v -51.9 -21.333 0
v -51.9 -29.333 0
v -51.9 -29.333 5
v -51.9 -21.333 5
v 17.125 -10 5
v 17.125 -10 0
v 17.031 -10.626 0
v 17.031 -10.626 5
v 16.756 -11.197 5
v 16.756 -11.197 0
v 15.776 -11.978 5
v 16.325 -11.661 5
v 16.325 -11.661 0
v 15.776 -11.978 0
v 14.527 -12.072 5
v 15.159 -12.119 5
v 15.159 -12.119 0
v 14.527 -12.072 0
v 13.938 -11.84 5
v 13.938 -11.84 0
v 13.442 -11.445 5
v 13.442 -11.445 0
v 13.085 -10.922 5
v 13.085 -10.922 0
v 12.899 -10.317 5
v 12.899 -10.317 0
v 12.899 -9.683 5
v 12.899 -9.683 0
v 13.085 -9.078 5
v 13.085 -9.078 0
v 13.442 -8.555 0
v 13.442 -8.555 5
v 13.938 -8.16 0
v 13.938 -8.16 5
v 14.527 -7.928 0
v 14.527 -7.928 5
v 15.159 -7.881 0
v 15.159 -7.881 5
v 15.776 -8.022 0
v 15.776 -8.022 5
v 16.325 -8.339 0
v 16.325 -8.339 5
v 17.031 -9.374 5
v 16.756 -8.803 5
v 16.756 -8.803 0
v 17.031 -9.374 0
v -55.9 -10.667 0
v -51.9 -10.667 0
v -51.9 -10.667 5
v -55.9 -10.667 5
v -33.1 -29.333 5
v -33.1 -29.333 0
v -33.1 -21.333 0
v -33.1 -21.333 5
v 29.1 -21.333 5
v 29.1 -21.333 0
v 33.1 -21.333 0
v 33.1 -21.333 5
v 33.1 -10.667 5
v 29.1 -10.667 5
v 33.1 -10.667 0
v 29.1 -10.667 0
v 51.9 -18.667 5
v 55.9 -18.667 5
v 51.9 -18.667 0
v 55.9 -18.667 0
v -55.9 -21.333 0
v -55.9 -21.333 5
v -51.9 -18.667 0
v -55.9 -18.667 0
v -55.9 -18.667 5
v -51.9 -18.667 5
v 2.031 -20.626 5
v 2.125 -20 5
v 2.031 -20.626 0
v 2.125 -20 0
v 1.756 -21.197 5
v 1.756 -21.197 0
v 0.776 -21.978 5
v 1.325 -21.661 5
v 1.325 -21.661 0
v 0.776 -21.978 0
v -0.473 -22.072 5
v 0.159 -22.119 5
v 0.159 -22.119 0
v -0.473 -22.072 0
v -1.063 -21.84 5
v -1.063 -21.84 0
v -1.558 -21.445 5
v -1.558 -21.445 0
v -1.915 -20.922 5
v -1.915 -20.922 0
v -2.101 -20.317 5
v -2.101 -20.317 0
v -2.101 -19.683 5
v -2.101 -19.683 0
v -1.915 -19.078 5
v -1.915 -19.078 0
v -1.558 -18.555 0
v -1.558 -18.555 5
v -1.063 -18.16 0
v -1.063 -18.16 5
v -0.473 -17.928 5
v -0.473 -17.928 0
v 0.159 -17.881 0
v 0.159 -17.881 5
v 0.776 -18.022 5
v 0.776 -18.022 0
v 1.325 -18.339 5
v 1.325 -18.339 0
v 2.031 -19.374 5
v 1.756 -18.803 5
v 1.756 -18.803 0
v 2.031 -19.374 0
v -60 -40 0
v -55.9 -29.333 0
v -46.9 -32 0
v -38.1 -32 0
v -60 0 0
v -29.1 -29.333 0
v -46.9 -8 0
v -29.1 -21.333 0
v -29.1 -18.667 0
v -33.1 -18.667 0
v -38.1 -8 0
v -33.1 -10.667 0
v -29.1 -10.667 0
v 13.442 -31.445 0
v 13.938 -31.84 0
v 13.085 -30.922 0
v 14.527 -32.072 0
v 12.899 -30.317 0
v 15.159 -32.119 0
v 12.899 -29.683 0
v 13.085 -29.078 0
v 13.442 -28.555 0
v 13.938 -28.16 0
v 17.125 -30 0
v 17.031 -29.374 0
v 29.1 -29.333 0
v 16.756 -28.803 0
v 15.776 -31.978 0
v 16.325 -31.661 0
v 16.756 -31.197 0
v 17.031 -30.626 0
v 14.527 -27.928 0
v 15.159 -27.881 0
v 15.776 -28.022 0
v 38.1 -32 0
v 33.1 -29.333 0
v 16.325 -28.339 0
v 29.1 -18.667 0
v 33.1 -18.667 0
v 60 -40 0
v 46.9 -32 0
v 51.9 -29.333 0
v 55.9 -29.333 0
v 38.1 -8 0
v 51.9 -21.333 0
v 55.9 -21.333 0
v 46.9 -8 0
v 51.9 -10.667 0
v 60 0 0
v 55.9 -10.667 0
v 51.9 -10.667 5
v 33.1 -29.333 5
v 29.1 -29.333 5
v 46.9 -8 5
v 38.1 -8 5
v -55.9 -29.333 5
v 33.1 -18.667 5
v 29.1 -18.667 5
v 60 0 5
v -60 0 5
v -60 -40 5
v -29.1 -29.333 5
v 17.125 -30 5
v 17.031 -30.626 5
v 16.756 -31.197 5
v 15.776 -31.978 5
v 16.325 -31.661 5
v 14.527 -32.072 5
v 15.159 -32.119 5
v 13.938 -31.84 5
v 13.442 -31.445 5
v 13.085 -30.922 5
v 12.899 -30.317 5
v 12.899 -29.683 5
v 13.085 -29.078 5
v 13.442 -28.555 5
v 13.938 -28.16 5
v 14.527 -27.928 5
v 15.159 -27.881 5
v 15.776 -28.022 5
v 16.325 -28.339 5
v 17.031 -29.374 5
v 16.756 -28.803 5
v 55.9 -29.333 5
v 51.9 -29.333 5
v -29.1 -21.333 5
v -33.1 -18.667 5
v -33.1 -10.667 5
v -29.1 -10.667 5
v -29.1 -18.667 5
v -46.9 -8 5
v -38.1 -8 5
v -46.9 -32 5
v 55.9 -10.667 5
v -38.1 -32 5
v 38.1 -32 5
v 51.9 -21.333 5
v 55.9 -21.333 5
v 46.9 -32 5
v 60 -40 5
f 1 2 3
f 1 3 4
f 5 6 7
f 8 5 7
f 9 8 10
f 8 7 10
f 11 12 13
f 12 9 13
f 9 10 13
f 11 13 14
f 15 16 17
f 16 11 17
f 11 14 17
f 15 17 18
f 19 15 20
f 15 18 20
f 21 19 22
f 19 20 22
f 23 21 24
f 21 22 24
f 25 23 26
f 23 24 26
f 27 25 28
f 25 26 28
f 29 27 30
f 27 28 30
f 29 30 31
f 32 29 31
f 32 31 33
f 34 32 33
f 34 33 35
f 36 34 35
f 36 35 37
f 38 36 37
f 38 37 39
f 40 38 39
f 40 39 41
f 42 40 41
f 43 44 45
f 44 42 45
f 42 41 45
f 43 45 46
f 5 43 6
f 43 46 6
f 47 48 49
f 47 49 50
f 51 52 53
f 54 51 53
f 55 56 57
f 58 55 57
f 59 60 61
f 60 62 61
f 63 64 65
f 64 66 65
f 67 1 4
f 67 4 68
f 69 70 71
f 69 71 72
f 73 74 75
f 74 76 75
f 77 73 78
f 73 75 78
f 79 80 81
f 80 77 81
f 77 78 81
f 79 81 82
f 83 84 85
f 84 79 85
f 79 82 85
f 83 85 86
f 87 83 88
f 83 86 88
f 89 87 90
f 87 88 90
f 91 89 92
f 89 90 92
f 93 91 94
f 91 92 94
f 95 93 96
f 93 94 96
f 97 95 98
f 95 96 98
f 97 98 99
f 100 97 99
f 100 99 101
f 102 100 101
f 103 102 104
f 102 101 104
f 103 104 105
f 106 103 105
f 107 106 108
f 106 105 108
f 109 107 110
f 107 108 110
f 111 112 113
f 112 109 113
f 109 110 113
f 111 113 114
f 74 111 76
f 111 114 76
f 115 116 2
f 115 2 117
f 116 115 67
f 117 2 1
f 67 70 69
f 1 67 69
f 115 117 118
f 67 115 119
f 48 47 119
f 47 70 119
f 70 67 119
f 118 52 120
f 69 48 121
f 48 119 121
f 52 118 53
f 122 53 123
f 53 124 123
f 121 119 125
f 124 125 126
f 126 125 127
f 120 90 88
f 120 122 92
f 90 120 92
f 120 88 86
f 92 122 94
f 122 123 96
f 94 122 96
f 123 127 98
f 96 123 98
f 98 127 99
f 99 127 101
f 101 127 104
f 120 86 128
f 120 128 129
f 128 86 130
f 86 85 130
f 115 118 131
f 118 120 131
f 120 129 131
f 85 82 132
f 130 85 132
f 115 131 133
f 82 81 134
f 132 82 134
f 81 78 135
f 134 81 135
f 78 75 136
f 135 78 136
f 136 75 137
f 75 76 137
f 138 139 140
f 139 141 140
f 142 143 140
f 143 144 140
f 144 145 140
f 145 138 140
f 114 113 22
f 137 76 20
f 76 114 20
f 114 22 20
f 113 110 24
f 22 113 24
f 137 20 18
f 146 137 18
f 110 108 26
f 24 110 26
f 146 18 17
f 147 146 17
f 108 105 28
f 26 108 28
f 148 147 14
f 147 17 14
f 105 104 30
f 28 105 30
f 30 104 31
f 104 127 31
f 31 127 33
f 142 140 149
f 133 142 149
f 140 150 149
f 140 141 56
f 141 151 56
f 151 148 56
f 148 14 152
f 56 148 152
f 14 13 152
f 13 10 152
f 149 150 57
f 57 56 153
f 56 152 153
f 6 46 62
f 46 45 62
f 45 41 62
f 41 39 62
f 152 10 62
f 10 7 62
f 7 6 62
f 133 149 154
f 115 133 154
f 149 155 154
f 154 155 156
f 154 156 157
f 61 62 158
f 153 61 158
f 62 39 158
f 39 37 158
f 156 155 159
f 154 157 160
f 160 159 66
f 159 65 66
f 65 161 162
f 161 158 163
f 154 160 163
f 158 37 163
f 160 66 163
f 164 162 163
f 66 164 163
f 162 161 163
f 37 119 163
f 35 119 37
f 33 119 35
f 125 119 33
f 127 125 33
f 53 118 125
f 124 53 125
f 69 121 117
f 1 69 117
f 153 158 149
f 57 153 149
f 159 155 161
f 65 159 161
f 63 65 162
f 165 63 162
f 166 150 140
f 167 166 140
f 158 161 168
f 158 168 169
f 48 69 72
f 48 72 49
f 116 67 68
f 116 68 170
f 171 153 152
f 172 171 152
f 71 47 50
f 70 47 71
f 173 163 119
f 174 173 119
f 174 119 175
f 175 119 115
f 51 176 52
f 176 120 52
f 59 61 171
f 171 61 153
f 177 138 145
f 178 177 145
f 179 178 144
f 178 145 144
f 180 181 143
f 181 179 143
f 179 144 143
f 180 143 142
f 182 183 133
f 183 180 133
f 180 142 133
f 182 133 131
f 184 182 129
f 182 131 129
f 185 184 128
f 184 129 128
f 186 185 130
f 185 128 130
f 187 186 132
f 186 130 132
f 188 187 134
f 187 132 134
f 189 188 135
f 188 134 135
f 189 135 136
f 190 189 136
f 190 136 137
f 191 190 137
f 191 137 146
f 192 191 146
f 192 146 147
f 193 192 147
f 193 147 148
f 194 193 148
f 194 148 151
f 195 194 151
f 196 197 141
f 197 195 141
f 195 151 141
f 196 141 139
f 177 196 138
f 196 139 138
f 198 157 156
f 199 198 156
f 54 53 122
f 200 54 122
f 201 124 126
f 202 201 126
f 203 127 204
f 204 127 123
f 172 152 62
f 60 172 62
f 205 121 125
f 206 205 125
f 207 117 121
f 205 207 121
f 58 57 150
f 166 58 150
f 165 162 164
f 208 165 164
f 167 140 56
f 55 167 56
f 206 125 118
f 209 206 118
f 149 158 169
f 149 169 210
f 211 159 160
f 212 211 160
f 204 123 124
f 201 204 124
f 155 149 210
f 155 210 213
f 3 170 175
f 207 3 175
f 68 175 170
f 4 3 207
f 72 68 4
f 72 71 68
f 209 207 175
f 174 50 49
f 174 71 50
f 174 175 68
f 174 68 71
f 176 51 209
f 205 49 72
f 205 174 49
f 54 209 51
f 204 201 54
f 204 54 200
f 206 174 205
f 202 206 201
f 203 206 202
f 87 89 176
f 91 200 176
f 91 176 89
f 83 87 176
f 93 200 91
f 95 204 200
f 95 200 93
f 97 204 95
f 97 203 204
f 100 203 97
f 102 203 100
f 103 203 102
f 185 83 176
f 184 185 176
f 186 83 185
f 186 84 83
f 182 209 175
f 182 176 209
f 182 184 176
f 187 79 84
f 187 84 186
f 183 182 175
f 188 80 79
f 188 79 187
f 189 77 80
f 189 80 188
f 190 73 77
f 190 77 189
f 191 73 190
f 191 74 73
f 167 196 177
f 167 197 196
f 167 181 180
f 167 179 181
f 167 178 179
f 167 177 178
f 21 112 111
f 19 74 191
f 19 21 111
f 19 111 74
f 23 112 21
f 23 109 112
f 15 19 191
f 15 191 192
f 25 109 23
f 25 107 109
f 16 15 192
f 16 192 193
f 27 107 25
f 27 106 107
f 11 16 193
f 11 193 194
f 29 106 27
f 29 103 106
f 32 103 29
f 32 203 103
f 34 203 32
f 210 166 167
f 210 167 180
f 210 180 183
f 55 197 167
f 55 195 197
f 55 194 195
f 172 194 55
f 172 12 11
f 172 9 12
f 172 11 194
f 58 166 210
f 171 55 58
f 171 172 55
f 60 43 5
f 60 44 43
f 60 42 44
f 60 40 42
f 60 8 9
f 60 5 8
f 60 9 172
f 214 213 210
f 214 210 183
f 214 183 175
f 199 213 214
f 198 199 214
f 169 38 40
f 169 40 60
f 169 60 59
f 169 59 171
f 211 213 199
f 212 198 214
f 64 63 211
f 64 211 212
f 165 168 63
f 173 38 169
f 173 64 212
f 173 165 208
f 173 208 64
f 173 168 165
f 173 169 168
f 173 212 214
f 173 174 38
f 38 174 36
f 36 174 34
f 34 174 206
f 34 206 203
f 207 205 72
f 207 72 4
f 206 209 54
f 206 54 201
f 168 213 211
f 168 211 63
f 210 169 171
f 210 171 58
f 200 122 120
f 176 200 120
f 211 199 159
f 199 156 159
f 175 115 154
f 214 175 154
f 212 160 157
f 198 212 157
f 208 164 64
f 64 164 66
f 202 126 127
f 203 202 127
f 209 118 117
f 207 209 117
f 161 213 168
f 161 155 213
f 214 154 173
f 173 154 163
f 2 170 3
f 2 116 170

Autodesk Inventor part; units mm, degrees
ref_plane "YZ Plane" through (0, 0, 0) normal (1, 0, 0) x (0, 1, 0)
ref_plane "XZ Plane" through (0, 0, 0) normal (0, 1, 0) x (-1, 0, 0)
ref_plane "XY Plane" through (0, 0, 0) normal (0, 0, 1) x (1, 0, 0)
sketch "Sketch1" plane through (0, 0, 0) normal (0, 0, 1) x (1, 0, 0)
  line L0 (60, 0) -> (-60, 0)
  line L1 (-60, 0) -> (-60, -40)
  line L2 (-60, -40) -> (60, -40)
  line L3 (60, -40) -> (60, 0)
  line L4 (46.9, -8) -> (38.1, -8)
  line L5 (38.1, -8) -> (38.1, -32)
  line L6 (38.1, -32) -> (46.9, -32)
  line L7 (46.9, -32) -> (46.9, -8)
  line L8 (46.9, -8) -> (46.9, 0) construction
  line L9 (46.9, -32) -> (46.9, -40) construction
  line L10 (0, 0) -> (5.0949, 0) construction
  line L11 (-46.9, -8) -> (-38.1, -8)
  line L12 (-38.1, -8) -> (-38.1, -32)
  line L13 (-38.1, -32) -> (-46.9, -32)
  line L14 (-46.9, -32) -> (-46.9, -8)
  line L15 (-42.5, -23.6928) -> (-38.1, -23.6928) construction
  line L16 (-42.5, -23.6928) -> (-46.9, -23.6928) construction
  line L17 (46.9, -20) -> (60, -20) construction
  line L18 (-60, -20) -> (-46.9, -20) construction
  line L19 (51.9, -10.6667) -> (55.9, -10.6667)
  line L20 (55.9, -10.6667) -> (55.9, -18.6667)
  line L21 (55.9, -18.6667) -> (51.9, -18.6667)
  line L22 (51.9, -18.6667) -> (51.9, -10.6667)
  line L23 (51.9, -21.3333) -> (55.9, -21.3333)
  line L24 (55.9, -21.3333) -> (55.9, -29.3333)
  line L25 (55.9, -29.3333) -> (51.9, -29.3333)
  line L26 (51.9, -29.3333) -> (51.9, -21.3333)
  line L27 (51.9, -10.6667) -> (51.9, -8) construction
  line L28 (46.9, -8) -> (51.9, -8) construction
  line L29 (51.9, -18.6667) -> (51.9, -21.3333) construction
  line L30 (51.9, -29.3333) -> (51.9, -32) construction
  line L31 (46.9, -32) -> (51.9, -32) construction
  line L32 (29.1, -10.6667) -> (33.1, -10.6667)
  line L33 (33.1, -10.6667) -> (33.1, -18.6667)
  line L34 (33.1, -18.6667) -> (29.1, -18.6667)
  line L35 (29.1, -18.6667) -> (29.1, -10.6667)
  line L36 (29.1, -21.3333) -> (33.1, -21.3333)
  line L37 (33.1, -21.3333) -> (33.1, -29.3333)
  line L38 (33.1, -29.3333) -> (29.1, -29.3333)
  line L39 (29.1, -29.3333) -> (29.1, -21.3333)
  line L40 (38.1, -8) -> (33.1, -8) construction
  line L41 (33.1, -8) -> (33.1, -10.6667) construction
  line L42 (33.1, -18.6667) -> (33.1, -21.3333) construction
  line L43 (33.1, -29.3333) -> (33.1, -32) construction
  line L44 (33.1, -32) -> (38.1, -32) construction
  line L45 (-33.1, -10.6667) -> (-29.1, -10.6667)
  line L46 (-29.1, -10.6667) -> (-29.1, -18.6667)
  line L47 (-29.1, -18.6667) -> (-33.1, -18.6667)
  line L48 (-33.1, -18.6667) -> (-33.1, -10.6667)
  line L49 (-33.1, -21.3333) -> (-29.1, -21.3333)
  line L50 (-29.1, -21.3333) -> (-29.1, -29.3333)
  line L51 (-29.1, -29.3333) -> (-33.1, -29.3333)
  line L52 (-33.1, -29.3333) -> (-33.1, -21.3333)
  line L53 (-55.9, -29.3333) -> (-51.9, -29.3333)
  line L54 (-51.9, -29.3333) -> (-51.9, -21.3333)
  line L55 (-51.9, -21.3333) -> (-55.9, -21.3333)
  line L56 (-55.9, -21.3333) -> (-55.9, -29.3333)
  line L57 (-51.9, -10.6667) -> (-55.9, -10.6667)
  line L58 (-55.9, -10.6667) -> (-55.9, -18.6667)
  line L59 (-55.9, -18.6667) -> (-51.9, -18.6667)
  line L60 (-51.9, -18.6667) -> (-51.9, -10.6667)
  line L61 (-33.1, -29.3333) -> (-38.1, -29.3333) construction
  line L62 (-51.9, -29.3333) -> (-46.9, -29.3333) construction
  circle A0 centre (15, -30) radius 2.125
  circle A1 centre (15, -10) radius 2.125
  line L63 (15, -10) -> (15, -30) construction
  line L64 (15, -30) -> (15, -40) construction
  line L65 (15, -10) -> (15, 0) construction
  circle A2 centre (0, -20) radius 2.125
  line L66 (0, -20) -> (0, -40) construction
  line L67 (0, -20) -> (0, 0) construction
  dimension "d0" = 120
  dimension "d1" = 40
  dimension "d2" = 8.8
  dimension "d3" = 24
  dimension "d4" = 8.8
  dimension "d5" = 24
  dimension "d6" = 4
  dimension "d7" = 8
  dimension "d8" = 5
  dimension "d11" = 76.2
  dimension "d14" = 4.25
  dimension "d15" = 4.25
  dimension "d16" = 20
  dimension "d17" = 45
  dimension "d18" = 4.25
extrude "Extrusion1" add sketch "Sketch1" along normal blind 5
sketch "Sketch2" plane through (-46.9, -8, 0) normal (0, -1, 0) x (1, 0, 0)
  circle A0 centre (4.4, 11.0737) radius 7.5
  circle A1 centre (89.4, 11.0737) radius 7.5
  point P0 (46.9, 0)
  point P1 (0, 5)
  point P2 (8.8, 5)
  point P3 (85, 5)
  point P4 (93.8, 5)
  dimension "d12" = 15
  dimension "d13" = 15
properties part number "YCartFloor"
